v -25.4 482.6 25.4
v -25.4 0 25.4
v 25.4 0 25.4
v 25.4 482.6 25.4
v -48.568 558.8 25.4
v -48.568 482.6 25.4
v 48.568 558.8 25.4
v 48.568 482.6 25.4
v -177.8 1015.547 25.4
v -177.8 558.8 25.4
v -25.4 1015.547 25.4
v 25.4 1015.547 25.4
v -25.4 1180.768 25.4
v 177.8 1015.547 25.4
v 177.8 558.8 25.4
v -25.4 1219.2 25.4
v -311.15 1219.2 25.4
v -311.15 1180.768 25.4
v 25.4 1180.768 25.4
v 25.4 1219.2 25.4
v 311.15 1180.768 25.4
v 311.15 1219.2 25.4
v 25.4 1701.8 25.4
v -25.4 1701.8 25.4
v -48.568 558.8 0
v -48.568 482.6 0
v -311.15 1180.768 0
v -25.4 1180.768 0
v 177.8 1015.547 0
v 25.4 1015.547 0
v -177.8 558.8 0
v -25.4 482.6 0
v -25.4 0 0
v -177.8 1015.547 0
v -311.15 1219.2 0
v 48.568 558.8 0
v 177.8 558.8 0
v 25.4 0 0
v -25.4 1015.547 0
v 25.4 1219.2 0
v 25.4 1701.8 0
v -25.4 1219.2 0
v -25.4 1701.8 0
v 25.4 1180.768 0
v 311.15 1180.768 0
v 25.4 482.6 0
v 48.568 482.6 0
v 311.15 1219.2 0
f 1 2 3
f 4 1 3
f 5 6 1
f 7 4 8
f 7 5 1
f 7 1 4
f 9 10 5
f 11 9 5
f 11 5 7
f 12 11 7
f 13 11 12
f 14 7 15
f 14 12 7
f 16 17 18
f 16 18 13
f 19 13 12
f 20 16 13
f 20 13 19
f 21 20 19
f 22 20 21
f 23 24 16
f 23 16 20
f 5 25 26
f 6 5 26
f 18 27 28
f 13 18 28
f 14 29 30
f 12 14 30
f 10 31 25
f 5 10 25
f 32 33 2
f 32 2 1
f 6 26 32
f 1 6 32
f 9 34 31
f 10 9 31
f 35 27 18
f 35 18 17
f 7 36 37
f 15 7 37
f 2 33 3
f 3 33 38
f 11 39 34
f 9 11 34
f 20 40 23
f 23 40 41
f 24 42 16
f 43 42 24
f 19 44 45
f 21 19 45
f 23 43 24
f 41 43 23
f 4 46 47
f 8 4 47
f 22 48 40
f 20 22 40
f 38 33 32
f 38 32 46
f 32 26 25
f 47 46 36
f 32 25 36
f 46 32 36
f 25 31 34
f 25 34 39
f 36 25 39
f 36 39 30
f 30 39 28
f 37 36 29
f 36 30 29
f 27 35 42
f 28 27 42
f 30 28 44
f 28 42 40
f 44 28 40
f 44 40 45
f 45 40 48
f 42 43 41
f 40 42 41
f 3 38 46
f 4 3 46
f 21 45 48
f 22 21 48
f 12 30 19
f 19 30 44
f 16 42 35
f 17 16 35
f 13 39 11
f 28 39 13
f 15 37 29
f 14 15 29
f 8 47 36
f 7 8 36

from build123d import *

# Parameters (mm, degrees)
F0_W     = 50.8
F0_H     = 482.6
F0_W_2   = 23.167712307
F0_H_2   = 76.2
F0_H_3   = 145.5220067978
F0_H_4   = 311.2254058838
F0_H_5   = 165.2207044601
F0_W_3   = 285.75
F0_H_6   = 38.4318828583
F1_DEPTH = 25.4


with BuildPart() as f1:
    # F0 (on Top) → F1 (new body)
    with BuildSketch(Plane.XY):
        with Locations((0, 241.3)):
            Rectangle(F0_W, F0_H)
        with Locations((-36.9838561535, 520.7)):
            Rectangle(F0_W_2, F0_H_2)
        with Locations((0, 520.7)):
            Rectangle(F0_W, F0_H_2)
        with Locations((36.9838561535, 520.7)):
            Rectangle(F0_W_2, F0_H_2)
        with Locations((-36.9838561535, 631.5610033989)):
            Rectangle(F0_W_2, F0_H_3)
        with Locations((36.9838561535, 631.5610033989)):
            Rectangle(F0_W_2, F0_H_3)
        Polygon((-48.567712307, 704.3220067978), (-25.4, 704.3220067978), (-25.4, 1015.5474126816), (-177.8, 1015.5474126816), (-177.8, 558.8), (-48.567712307, 558.8), align=None)
        with Locations((0, 859.9347097397)):
            Rectangle(F0_W, F0_H_4)
        Polygon((25.4, 1015.5474126816), (25.4, 704.3220067978), (48.567712307, 704.3220067978), (48.567712307, 558.8), (177.8, 558.8), (177.8, 1015.5474126816), align=None)
        with Locations((0, 1098.1577649117)):
            Rectangle(F0_W, F0_H_5)
        with Locations((-168.275, 1199.9840585709)):
            Rectangle(F0_W_3, F0_H_6)
        with Locations((0, 1199.9840585709)):
            Rectangle(F0_W, F0_H_6)
        with Locations((168.275, 1199.9840585709)):
            Rectangle(F0_W_3, F0_H_6)
        with Locations((0, 1460.5)):
            Rectangle(F0_W, F0_H)
        with Locations((0, 631.5610033989)):
            Rectangle(F0_W, F0_H_3)
    extrude(amount=F1_DEPTH)


solid = f1.part
